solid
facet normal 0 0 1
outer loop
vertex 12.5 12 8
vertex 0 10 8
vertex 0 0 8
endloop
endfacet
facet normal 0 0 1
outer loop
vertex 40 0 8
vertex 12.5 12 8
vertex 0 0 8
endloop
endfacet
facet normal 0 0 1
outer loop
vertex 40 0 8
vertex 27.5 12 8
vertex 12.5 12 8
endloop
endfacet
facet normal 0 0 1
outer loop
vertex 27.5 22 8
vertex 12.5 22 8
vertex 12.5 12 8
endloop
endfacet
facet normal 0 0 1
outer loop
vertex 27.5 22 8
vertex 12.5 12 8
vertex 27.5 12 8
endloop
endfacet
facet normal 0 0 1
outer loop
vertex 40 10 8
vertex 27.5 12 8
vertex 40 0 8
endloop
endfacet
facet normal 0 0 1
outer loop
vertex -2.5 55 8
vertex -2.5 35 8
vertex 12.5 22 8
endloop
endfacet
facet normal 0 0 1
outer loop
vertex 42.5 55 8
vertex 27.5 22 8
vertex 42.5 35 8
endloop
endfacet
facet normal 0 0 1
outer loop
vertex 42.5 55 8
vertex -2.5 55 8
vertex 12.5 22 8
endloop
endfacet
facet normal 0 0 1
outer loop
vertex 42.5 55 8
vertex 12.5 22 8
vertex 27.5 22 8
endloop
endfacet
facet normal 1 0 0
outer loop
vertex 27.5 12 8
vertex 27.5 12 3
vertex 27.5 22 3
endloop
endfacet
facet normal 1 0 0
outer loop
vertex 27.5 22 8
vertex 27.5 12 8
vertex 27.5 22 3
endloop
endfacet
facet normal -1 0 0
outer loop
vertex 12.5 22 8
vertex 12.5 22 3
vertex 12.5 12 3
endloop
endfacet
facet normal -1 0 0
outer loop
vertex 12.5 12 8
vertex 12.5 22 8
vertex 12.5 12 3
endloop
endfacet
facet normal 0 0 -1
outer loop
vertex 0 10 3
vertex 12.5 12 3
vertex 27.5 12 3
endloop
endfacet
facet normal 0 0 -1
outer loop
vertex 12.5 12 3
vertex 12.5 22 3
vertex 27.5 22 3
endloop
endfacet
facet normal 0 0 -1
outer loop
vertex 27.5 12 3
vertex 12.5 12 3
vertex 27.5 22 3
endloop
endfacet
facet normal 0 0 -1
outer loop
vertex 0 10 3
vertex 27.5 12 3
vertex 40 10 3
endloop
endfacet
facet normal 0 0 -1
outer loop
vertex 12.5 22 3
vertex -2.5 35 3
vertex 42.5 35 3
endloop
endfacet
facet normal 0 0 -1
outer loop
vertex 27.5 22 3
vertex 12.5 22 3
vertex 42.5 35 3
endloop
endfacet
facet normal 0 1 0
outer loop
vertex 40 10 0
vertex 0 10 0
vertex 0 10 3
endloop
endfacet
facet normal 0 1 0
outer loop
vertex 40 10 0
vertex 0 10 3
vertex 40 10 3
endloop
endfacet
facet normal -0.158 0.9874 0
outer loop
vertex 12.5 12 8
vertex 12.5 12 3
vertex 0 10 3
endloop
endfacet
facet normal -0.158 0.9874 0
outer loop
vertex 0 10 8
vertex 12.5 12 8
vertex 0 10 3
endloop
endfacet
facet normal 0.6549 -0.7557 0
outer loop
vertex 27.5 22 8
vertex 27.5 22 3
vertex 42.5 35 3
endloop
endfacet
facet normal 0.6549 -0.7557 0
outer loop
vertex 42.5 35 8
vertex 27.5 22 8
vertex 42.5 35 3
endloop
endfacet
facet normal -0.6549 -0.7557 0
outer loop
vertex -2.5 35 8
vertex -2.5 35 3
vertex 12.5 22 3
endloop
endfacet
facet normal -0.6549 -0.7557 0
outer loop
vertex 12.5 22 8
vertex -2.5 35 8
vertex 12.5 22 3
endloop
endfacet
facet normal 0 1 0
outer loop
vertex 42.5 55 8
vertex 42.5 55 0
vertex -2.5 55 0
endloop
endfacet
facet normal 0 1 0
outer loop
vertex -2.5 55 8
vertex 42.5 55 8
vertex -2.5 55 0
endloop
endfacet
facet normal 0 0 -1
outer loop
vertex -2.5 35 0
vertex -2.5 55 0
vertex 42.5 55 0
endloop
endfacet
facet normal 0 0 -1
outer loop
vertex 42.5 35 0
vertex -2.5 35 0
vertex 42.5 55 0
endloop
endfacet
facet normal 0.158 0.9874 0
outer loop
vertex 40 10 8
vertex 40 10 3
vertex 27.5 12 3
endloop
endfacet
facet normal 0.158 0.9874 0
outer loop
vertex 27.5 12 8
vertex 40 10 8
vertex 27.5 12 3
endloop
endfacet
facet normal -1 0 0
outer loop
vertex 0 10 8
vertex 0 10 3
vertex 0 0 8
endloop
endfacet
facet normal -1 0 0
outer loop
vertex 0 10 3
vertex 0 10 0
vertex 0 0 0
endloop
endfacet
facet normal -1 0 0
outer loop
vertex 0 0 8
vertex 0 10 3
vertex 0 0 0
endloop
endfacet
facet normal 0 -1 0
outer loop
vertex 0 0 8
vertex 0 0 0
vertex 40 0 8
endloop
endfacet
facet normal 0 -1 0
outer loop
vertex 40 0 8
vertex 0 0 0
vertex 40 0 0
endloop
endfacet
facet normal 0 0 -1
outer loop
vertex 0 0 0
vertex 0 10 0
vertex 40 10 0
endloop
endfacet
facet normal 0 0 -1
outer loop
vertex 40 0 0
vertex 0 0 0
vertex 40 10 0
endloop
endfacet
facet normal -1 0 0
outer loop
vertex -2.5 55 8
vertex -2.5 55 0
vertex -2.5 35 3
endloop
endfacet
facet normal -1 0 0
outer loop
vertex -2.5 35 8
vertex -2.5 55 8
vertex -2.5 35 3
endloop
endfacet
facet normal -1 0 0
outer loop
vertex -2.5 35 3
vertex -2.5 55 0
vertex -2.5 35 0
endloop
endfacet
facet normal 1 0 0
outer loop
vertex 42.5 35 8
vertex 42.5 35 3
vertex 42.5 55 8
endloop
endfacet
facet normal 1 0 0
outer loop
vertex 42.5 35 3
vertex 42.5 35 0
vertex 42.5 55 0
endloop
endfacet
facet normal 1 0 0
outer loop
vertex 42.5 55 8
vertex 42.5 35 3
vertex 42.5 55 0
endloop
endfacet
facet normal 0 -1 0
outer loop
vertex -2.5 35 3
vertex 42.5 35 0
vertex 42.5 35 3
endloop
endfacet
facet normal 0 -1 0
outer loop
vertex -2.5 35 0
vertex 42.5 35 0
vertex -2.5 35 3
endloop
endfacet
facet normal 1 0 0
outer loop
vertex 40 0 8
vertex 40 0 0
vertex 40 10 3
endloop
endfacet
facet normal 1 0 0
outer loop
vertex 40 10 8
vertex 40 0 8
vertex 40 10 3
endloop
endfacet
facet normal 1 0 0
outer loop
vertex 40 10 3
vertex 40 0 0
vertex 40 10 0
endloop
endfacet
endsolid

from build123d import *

# Parameters (mm, degrees)
EXTRUDE_1_DEPTH     = 8
CUT_EXTRUDE_1_DEPTH = 3


with BuildPart() as part:
    # Эскиз2 → Бобышка-Вытянуть1 (new body)
    with BuildSketch(Plane.XY):
        Polygon((0, 0), (40, 0), (40, 10), (27.5, 12), (27.5, 22), (42.5, 35), (42.5, 55), (-2.5, 55), (-2.5, 35), (12.5, 22), (12.5, 12), (0, 10), align=None)
    extrude(amount=EXTRUDE_1_DEPTH)

    # Эскиз3 → Вырез-Вытянуть1 (cut)
    with BuildSketch(Plane(origin=(0, 0, 0), x_dir=(-1, 0, 0), z_dir=(0, 0, -1))):
        Polygon((-40, 10), (-27.5, 12), (-27.5, 22), (-42.5, 35), (2.5, 35), (-12.5, 22), (-12.5, 12), (0, 10), align=None)
    extrude(amount=-CUT_EXTRUDE_1_DEPTH, mode=Mode.SUBTRACT)


solid = part.part
